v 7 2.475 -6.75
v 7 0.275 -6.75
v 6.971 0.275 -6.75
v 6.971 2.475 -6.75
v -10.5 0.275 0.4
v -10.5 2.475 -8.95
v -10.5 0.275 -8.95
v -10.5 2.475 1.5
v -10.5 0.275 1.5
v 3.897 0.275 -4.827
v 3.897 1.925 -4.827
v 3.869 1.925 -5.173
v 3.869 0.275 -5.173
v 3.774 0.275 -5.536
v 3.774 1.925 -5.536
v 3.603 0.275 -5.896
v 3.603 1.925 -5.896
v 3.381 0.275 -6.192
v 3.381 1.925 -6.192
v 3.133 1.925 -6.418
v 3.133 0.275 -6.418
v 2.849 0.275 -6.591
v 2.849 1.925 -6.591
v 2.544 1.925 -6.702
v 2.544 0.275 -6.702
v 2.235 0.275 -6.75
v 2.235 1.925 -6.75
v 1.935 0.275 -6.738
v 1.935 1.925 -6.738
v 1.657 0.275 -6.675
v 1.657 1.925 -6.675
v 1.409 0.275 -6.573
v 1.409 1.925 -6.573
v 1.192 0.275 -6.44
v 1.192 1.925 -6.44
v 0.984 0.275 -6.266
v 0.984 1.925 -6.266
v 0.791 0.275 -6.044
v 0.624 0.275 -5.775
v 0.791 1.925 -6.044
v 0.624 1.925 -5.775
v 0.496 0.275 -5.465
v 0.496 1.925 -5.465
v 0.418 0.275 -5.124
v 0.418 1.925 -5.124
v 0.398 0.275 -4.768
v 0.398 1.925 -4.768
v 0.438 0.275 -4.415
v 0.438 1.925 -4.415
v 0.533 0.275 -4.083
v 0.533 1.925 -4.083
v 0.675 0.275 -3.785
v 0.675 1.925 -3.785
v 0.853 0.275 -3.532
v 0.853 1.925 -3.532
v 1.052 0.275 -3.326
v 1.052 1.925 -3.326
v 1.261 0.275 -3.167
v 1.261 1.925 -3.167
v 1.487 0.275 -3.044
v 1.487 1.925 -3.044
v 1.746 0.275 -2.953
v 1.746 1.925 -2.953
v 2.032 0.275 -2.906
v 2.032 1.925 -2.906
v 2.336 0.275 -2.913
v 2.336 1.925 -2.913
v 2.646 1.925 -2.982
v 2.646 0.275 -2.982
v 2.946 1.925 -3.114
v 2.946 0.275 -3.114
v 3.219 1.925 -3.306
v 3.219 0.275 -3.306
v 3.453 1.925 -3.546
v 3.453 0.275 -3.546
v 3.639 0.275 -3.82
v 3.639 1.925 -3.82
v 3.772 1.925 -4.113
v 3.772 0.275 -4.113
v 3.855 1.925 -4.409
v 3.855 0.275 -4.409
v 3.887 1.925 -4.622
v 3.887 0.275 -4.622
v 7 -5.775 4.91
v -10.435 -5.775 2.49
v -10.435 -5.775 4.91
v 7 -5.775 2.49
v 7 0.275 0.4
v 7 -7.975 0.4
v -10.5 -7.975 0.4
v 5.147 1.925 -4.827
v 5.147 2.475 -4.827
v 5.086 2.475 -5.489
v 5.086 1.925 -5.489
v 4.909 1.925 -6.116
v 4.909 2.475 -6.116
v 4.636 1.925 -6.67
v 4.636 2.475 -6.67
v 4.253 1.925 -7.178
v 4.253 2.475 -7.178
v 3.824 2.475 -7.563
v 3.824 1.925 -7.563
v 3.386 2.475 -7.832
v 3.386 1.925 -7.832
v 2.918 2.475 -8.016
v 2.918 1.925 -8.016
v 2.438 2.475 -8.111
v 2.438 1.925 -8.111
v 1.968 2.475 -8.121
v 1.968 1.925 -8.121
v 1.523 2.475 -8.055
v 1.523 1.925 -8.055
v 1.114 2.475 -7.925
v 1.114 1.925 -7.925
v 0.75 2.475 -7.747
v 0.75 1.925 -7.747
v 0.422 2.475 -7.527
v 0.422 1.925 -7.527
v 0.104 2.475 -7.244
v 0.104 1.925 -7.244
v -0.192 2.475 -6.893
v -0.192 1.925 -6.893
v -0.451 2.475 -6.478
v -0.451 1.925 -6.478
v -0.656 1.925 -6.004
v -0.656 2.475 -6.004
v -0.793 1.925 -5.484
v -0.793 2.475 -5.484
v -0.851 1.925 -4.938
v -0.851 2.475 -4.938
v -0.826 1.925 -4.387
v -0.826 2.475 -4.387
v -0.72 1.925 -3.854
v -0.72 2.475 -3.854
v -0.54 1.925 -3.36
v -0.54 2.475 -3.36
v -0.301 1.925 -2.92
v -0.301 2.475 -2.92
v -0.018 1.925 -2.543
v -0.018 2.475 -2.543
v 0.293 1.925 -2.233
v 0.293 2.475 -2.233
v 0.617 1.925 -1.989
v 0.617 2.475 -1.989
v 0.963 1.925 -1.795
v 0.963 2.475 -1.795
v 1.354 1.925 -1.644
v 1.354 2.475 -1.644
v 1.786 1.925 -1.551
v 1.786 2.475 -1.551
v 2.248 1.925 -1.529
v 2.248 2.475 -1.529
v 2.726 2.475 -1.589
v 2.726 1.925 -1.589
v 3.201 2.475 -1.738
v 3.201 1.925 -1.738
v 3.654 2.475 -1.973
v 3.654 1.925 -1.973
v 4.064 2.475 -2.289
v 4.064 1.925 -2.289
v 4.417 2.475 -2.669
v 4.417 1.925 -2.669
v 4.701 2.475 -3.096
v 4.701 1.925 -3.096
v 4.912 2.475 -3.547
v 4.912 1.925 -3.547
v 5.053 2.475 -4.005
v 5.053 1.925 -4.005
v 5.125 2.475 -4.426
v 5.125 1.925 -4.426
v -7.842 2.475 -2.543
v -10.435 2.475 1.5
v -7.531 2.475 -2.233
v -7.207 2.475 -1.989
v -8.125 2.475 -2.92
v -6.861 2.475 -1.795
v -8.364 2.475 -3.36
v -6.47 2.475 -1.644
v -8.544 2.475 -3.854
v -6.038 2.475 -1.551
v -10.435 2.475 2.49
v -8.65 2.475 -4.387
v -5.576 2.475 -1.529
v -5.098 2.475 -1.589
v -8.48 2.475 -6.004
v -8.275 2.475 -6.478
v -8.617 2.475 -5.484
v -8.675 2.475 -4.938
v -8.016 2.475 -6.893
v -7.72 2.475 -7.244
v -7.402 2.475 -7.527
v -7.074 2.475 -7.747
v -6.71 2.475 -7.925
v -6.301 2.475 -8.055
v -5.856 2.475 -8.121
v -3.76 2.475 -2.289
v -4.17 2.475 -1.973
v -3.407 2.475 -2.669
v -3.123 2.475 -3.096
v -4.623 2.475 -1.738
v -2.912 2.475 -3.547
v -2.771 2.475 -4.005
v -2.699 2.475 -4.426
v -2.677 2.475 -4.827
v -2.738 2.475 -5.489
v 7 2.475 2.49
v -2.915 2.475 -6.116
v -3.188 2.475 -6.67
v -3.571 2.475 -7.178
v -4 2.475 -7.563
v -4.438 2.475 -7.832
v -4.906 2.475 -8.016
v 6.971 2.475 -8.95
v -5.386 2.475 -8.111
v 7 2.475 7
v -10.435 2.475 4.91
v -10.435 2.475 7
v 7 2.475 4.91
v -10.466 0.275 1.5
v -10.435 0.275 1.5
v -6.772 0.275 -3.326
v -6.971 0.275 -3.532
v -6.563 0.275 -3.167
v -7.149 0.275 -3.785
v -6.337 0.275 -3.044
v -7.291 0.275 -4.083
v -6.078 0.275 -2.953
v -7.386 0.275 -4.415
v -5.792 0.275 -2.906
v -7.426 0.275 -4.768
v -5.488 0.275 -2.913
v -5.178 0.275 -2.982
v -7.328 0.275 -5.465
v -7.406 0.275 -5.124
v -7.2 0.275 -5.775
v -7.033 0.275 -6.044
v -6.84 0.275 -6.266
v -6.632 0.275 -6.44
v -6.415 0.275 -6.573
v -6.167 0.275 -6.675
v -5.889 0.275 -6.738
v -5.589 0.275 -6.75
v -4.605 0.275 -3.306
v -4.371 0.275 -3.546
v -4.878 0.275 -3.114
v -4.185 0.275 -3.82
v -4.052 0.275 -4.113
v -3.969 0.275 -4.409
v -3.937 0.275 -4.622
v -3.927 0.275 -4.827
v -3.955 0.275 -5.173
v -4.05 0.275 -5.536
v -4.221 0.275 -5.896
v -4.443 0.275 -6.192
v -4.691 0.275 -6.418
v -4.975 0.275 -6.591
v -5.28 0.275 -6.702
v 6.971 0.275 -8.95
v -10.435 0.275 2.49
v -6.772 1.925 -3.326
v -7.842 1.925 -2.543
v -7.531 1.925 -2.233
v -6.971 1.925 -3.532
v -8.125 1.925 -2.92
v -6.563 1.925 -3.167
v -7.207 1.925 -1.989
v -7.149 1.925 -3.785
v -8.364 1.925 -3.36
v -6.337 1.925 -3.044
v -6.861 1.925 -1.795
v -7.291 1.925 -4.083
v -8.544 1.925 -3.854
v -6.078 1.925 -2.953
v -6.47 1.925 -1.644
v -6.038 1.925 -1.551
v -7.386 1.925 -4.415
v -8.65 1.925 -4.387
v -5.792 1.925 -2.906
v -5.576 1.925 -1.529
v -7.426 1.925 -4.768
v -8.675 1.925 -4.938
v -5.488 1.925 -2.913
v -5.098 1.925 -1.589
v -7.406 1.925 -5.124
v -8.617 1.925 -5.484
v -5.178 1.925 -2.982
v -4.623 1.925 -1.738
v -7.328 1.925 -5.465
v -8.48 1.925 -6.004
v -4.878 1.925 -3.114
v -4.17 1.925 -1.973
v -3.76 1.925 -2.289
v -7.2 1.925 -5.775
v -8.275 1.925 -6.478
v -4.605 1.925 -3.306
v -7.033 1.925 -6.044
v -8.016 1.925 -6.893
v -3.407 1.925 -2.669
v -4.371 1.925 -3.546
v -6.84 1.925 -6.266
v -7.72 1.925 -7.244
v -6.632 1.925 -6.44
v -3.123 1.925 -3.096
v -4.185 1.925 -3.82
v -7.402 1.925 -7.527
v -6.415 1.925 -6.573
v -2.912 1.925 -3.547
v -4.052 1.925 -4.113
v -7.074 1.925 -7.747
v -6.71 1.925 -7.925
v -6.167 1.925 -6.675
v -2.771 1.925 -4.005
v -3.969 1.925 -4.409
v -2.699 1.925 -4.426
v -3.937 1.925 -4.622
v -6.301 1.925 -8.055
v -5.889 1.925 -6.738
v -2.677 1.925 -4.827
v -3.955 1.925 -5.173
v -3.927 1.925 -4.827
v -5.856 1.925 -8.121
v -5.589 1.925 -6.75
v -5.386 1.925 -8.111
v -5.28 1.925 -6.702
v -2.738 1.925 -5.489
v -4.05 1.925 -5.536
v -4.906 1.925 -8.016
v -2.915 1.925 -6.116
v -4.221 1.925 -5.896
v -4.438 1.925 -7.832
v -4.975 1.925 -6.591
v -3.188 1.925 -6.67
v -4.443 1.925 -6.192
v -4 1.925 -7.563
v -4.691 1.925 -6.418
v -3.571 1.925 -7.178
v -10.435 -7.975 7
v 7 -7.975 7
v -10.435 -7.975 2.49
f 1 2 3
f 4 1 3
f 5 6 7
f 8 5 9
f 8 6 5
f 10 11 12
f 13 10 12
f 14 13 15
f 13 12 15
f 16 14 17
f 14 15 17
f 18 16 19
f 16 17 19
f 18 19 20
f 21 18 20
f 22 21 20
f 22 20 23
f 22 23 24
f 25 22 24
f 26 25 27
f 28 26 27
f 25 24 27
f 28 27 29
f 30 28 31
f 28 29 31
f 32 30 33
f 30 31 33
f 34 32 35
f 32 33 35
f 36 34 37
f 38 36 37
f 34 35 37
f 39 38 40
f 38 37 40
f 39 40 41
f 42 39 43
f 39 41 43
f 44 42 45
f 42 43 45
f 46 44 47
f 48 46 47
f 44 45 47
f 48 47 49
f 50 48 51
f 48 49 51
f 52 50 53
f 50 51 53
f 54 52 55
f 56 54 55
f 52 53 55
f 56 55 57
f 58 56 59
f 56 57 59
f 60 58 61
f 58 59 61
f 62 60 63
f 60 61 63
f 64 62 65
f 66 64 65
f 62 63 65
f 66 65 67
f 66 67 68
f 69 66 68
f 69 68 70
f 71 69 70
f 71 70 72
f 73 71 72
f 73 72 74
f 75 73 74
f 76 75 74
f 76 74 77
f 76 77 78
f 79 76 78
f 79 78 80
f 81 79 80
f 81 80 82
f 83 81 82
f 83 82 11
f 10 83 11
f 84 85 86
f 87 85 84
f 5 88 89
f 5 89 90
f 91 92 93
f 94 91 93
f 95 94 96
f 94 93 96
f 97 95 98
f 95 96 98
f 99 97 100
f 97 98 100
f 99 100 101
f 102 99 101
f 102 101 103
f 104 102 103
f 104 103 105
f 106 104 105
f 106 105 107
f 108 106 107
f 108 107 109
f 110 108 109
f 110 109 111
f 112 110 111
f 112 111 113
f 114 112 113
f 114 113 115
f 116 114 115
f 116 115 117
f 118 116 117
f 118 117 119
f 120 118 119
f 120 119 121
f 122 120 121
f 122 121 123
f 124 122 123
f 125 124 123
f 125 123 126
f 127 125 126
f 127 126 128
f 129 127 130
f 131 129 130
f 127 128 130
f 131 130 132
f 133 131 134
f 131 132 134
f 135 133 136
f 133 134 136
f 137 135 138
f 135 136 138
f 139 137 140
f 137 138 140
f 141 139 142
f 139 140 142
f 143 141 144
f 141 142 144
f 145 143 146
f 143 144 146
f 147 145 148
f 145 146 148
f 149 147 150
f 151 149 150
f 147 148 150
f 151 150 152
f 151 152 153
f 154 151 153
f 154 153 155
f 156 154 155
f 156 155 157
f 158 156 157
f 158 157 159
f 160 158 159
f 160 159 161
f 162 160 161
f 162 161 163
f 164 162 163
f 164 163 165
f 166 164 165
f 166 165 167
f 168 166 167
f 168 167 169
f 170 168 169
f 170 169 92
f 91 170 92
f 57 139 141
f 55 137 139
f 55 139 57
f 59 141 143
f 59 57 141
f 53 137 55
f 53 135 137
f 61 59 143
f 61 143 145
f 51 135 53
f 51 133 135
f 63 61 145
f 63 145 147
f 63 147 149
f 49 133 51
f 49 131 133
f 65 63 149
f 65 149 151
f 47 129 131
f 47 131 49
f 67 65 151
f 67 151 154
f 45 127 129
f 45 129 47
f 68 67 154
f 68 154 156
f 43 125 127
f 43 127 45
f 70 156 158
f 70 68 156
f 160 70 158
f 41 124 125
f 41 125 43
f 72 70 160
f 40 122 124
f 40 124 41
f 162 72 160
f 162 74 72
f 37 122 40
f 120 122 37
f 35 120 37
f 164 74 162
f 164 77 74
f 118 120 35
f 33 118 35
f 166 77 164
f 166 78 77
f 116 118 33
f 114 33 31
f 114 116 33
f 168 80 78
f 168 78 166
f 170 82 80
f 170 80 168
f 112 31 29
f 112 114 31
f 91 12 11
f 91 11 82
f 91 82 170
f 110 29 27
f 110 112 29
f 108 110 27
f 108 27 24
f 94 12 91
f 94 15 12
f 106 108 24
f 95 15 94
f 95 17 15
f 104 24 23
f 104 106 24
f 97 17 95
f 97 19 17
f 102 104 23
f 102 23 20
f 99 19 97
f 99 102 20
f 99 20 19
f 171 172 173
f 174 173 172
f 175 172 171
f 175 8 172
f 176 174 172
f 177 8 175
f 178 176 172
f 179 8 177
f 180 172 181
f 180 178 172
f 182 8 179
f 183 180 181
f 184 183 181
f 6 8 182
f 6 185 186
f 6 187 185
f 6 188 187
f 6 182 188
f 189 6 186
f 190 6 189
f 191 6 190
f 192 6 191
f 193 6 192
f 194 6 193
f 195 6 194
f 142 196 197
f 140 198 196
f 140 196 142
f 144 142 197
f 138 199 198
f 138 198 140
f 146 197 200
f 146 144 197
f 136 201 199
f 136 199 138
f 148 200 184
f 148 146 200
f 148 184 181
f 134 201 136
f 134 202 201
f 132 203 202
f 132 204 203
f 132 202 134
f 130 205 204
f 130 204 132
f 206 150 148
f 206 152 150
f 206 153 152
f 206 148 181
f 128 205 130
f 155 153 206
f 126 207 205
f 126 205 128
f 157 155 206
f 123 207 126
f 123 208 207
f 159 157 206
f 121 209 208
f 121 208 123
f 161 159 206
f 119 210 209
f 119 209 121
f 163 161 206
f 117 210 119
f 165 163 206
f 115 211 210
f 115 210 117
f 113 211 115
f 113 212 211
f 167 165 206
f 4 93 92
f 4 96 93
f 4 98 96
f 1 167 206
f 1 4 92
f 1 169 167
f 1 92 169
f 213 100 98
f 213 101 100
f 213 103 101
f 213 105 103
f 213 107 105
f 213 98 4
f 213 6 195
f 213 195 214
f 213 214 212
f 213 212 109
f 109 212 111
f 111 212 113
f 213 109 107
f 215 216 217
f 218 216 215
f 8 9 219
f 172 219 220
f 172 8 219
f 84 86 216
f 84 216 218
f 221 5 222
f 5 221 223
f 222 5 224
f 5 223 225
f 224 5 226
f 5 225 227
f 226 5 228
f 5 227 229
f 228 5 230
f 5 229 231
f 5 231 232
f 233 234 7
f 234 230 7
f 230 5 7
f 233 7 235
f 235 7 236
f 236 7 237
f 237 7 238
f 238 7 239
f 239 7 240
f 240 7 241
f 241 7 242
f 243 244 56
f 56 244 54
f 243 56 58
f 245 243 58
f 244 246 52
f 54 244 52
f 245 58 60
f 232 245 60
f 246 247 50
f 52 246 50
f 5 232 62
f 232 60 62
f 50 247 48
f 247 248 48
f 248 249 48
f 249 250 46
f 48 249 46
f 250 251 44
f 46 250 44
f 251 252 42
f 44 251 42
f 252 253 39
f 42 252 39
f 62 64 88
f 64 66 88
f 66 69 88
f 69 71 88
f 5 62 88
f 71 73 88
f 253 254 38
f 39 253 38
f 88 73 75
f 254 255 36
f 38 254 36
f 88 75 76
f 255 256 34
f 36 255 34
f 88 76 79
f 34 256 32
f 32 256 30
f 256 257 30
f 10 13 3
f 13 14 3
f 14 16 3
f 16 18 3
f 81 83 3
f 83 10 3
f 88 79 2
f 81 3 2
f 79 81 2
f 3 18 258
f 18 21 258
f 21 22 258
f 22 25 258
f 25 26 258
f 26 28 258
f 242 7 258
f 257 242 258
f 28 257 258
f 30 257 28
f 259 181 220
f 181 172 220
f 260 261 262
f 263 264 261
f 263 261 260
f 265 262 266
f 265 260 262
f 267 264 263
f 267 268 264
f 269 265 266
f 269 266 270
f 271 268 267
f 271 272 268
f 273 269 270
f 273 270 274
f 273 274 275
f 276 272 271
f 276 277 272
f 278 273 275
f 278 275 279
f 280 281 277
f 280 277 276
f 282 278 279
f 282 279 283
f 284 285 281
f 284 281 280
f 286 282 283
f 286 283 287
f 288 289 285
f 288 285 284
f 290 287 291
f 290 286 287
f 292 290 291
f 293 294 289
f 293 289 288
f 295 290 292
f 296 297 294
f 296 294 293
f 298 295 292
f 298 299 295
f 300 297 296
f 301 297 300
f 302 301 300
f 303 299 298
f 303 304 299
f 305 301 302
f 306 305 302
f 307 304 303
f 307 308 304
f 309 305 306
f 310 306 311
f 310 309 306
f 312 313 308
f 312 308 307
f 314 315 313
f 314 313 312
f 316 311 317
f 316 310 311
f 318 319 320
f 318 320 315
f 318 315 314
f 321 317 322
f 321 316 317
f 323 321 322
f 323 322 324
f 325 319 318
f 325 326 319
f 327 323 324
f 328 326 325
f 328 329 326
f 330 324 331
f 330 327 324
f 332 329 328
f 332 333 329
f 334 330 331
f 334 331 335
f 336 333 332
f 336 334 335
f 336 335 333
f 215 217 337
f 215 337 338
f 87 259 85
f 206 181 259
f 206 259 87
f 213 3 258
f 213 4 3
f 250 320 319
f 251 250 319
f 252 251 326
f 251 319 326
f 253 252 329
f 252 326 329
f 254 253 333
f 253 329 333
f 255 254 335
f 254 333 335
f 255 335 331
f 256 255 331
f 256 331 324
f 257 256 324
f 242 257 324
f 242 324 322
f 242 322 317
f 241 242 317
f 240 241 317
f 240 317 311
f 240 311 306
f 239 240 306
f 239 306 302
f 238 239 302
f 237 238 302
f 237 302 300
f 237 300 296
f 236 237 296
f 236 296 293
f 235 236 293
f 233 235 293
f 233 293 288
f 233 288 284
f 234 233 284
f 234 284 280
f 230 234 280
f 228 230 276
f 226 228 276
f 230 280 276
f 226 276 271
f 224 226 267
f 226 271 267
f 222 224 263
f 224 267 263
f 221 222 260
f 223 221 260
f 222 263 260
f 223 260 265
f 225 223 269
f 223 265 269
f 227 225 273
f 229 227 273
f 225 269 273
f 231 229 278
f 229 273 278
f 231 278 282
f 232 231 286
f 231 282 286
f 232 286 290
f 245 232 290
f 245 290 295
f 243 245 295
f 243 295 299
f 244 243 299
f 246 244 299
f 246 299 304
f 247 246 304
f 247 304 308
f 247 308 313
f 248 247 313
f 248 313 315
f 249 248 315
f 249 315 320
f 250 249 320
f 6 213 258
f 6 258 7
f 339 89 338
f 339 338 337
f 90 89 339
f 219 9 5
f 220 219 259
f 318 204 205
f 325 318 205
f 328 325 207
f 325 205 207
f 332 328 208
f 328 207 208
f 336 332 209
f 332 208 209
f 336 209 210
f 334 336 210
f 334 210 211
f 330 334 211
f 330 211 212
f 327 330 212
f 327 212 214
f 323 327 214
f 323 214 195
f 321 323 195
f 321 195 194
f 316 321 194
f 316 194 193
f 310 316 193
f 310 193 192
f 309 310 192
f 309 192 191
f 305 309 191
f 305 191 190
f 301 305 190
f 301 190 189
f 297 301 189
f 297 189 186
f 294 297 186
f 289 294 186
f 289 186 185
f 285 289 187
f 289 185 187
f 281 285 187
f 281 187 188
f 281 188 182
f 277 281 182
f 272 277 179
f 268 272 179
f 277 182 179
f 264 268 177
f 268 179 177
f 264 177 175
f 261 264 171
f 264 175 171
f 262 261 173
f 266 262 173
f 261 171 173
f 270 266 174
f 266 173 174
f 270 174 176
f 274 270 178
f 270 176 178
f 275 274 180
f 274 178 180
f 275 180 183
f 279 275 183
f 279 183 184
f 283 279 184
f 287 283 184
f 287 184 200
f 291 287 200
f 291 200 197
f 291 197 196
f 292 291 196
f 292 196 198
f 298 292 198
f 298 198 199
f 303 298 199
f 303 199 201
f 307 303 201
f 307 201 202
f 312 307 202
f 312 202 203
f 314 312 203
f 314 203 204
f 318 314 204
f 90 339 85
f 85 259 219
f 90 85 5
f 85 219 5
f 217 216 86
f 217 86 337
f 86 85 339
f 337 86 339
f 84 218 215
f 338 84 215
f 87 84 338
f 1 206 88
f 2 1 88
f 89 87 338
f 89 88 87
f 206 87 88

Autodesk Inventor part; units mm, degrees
ref_plane "YZ Plane" through (0, 0, 0) normal (1, 0, 0) x (0, 1, 0)
ref_plane "XZ Plane" through (0, 0, 0) normal (0, 1, 0) x (-1, 0, 0)
ref_plane "XY Plane" through (0, 0, 0) normal (0, 0, 1) x (1, 0, 0)
sketch "Boceto1" plane through (0, 0, 0) normal (0, 1, 0) x (-1, 0, 0)
  line L0 (0, 0) -> (3.5, 0)
  line L1 (3.5, 0) -> (5.5, 0)
  line L2 (0, 0) -> (-2, 0)
  line L3 (-2, -5.5) -> (5.5, -5.5)
  line L4 (-2, 0) -> (-5, 0)
  line L5 (-5, -5.5) -> (-2, -5.5)
  line L6 (5.5, 0) -> (8.5, 0)
  line L7 (8.5, -5.5) -> (5.5, -5.5)
  line L8 (8.5, -5.5) -> (9.5, -5.5)
  line L9 (9.5, 0) -> (8.5, 0)
  line L10 (-5, -5.5) -> (-6, -5.5)
  line L11 (-6, 0) -> (-5, 0)
  line L12 (9.5, -5.5) -> (10.5, -5.5)
  line L13 (10.5, -5.5) -> (10.5, 0)
  line L14 (10.5, 0) -> (9.5, 0)
  line L15 (-6, -5.5) -> (-7, -5.5)
  line L16 (-7, -5.5) -> (-7, 0)
  line L17 (-7, 0) -> (-6, 0)
  dimension "d30" = 1
  dimension "d37" = 1
  dimension "d38" = 1
extrude "Extrusión3" add sketch "Boceto1" along normal blind 2
sketch "Boceto4" plane through (-8.5, 0, 0) normal (0, 0, 1) x (1, 0, 0)
  line L0 (15.5, 2) -> (-2, 2) projected
  line L1 (0, 2) -> (13.5, 2)
  line L2 (13.5, 2) -> (13.5, 0)
  line L3 (13.5, 0) -> (0, 0)
  line L4 (0, 0) -> (0, 2)
  point P0 (8.5, 0)
  point P1 (14.5, 2)
  point P2 (-1, 2)
extrude "Extrusión4" add sketch "Boceto4" along normal blind 2
sketch "Boceto13" plane through (0, 2, 0) normal (0, 1, 0) x (1, 0, 0)
  line L0 (7, 5.5) -> (-10.5, 5.5) projected
  line L1 (-10.5, 5.5) -> (6.9708, 5.5)
  line L2 (6.9708, 5.5) -> (6.9708, 7.5)
  line L3 (6.9708, 7.5) -> (-10.5, 7.5)
  line L4 (-10.5, 7.5) -> (-10.5, 5.5)
  point P0 (0, 0)
  point P1 (-8.5, 5.5)
extrude "Extrusión13" add sketch "Boceto13" against normal blind 2
sketch "Boceto14" plane through (0, 2, 0) normal (0, 1, 0) x (1, 0, 0)
  circle A0 centre (2.1471, 3.7519) radius 1.75
  circle A1 centre (-5.6769, 3.7519) radius 1.75
  line L0 (1.1471, 3.7519) -> (2.1471, 3.7519)
  line L1 (-4.6769, 3.7519) -> (-5.6769, 3.7519)
  point P0 (0, 0)
  dimension "d43" = 3.5
  dimension "d44" = 3.5
  dimension "d45" = 1
  dimension "d46" = 1
extrude "Extrusión14" cut sketch "Boceto14" against normal blind 2
sketch "Boceto15" plane through (0, 2, 0) normal (0, 1, 0) x (1, 0, 0)
  circle A0 centre (2.1471, 3.7519) radius 1.75 projected
  circle A1 centre (2.1471, 3.7519) radius 3
  circle A2 centre (-5.6769, 3.7519) radius 1.75 projected
  circle A3 centre (-5.6769, 3.7519) radius 3
  point P0 (0, 0)
  dimension "d49" = 6
  dimension "d50" = 6
extrude "Extrusión15" cut sketch "Boceto15" against normal blind 0.5
sketch "Boceto17" plane through (0, 2, 0) normal (0, 1, 0) x (1, 0, 0)
  line L0 (7, 0) -> (5, 0) projected
  line L1 (7, 0) -> (-10.5, 0)
  line L2 (-10.5, 0) -> (-10.5, -2)
  line L3 (-10.5, -2) -> (7, -2)
  line L4 (7, -2) -> (7, 0)
  point P0 (0, 0)
  dimension "d55" = 17.5
extrude "Extrusión17" add sketch "Boceto17" against normal blind 2
sketch "Boceto18" plane through (-8.5, 0, 2) normal (0, 0, 1) x (1, 0, 0)
  line L0 (-2, 2) -> (15.5, 2) projected
  line L1 (-1.9353, 0) -> (15.5, 0)
  line L2 (15.5, 0) -> (15.5, 2)
  line L3 (15.5, 2) -> (-1.9353, 2)
  line L4 (-1.9353, 2) -> (-1.9353, 0)
  point P0 (8.5, 0)
extrude "Extrusión18" add sketch "Boceto18" along normal blind 5
sketch "Boceto19" plane through (0, 0, 0) normal (0, -1, 0) x (1, 0, 0)
  line L0 (-10.5, -7.5) -> (-10.5, 2) projected
  line L1 (-10.4353, 2.9) -> (7, 2.9)
  line L2 (7, 2.9) -> (7, 1)
  line L3 (7, 1) -> (-10.5, 1)
  line L4 (-10.4353, 2.9) -> (-10.5, 1)
  line L5 (7, 7) -> (-10.4353, 7) projected
  line L6 (7, 7) -> (7, 5.1)
  line L7 (7, 7) -> (7, -5.5) projected
  line L8 (7, 5.1) -> (-10.4353, 5.1)
  line L9 (-10.4353, 2) -> (-10.4353, 7) projected
  line L10 (-10.4353, 7) -> (-10.4353, 5.1)
  line L11 (-10.4353, 7) -> (7, 7)
  point P0 (7, 1.001)
  dimension "d67" = 1.9
  dimension "d68" = 1.9
extrude "Extrusión20" add sketch "Boceto19" along normal blind 7.5 contours L1 L2 L3 L4 | L9 L5 L6 L8
sketch "Boceto21" plane through (-10.4353, 0, 2.9) normal (0, 0, 1) x (1, 0, 0)
  line L0 (17.4353, 0) -> (17.4353, -7.5) projected
  line L1 (0, 2) -> (0, -7.5) projected
  line L2 (17.4353, -7.5) -> (0, -7.5)
  line L3 (0, -7.5) -> (0, -5.5)
  line L4 (0, -5.5) -> (17.4353, -5.5)
  line L5 (17.4353, -5.5) -> (17.4353, -7.5)
  point P0 (10.4353, 0)
  dimension "d71" = 2
extrude "Extrusión21" add sketch "Boceto21" along normal blind 4
sketch "Boceto22" plane through (0, 0, 0) normal (0, -1, 0) x (1, 0, 0)
  line L0 (-10.4353, 2.9) -> (-10.4353, 5.1) projected
  line L1 (7, 2.9) -> (-10.4353, 2.9)
  line L2 (-10.4353, 2.9) -> (-10.4353, 5.1)
  line L3 (-10.4353, 5.1) -> (7, 5.1)
  line L4 (7, 5.1) -> (7, 2.9)
  point P0 (0, 0)
extrude "Extrusión22" cut sketch "Boceto22" against normal blind 6.25
scale "Escala1" factors (1, 1, 1.1) then translate (0, 0, -0.7) bodies 1
scale "Escala2" factors (1, 1.1, 1) then translate (0, 0.275, 0) bodies 1
properties part number "Pantalla - encaix slider"
